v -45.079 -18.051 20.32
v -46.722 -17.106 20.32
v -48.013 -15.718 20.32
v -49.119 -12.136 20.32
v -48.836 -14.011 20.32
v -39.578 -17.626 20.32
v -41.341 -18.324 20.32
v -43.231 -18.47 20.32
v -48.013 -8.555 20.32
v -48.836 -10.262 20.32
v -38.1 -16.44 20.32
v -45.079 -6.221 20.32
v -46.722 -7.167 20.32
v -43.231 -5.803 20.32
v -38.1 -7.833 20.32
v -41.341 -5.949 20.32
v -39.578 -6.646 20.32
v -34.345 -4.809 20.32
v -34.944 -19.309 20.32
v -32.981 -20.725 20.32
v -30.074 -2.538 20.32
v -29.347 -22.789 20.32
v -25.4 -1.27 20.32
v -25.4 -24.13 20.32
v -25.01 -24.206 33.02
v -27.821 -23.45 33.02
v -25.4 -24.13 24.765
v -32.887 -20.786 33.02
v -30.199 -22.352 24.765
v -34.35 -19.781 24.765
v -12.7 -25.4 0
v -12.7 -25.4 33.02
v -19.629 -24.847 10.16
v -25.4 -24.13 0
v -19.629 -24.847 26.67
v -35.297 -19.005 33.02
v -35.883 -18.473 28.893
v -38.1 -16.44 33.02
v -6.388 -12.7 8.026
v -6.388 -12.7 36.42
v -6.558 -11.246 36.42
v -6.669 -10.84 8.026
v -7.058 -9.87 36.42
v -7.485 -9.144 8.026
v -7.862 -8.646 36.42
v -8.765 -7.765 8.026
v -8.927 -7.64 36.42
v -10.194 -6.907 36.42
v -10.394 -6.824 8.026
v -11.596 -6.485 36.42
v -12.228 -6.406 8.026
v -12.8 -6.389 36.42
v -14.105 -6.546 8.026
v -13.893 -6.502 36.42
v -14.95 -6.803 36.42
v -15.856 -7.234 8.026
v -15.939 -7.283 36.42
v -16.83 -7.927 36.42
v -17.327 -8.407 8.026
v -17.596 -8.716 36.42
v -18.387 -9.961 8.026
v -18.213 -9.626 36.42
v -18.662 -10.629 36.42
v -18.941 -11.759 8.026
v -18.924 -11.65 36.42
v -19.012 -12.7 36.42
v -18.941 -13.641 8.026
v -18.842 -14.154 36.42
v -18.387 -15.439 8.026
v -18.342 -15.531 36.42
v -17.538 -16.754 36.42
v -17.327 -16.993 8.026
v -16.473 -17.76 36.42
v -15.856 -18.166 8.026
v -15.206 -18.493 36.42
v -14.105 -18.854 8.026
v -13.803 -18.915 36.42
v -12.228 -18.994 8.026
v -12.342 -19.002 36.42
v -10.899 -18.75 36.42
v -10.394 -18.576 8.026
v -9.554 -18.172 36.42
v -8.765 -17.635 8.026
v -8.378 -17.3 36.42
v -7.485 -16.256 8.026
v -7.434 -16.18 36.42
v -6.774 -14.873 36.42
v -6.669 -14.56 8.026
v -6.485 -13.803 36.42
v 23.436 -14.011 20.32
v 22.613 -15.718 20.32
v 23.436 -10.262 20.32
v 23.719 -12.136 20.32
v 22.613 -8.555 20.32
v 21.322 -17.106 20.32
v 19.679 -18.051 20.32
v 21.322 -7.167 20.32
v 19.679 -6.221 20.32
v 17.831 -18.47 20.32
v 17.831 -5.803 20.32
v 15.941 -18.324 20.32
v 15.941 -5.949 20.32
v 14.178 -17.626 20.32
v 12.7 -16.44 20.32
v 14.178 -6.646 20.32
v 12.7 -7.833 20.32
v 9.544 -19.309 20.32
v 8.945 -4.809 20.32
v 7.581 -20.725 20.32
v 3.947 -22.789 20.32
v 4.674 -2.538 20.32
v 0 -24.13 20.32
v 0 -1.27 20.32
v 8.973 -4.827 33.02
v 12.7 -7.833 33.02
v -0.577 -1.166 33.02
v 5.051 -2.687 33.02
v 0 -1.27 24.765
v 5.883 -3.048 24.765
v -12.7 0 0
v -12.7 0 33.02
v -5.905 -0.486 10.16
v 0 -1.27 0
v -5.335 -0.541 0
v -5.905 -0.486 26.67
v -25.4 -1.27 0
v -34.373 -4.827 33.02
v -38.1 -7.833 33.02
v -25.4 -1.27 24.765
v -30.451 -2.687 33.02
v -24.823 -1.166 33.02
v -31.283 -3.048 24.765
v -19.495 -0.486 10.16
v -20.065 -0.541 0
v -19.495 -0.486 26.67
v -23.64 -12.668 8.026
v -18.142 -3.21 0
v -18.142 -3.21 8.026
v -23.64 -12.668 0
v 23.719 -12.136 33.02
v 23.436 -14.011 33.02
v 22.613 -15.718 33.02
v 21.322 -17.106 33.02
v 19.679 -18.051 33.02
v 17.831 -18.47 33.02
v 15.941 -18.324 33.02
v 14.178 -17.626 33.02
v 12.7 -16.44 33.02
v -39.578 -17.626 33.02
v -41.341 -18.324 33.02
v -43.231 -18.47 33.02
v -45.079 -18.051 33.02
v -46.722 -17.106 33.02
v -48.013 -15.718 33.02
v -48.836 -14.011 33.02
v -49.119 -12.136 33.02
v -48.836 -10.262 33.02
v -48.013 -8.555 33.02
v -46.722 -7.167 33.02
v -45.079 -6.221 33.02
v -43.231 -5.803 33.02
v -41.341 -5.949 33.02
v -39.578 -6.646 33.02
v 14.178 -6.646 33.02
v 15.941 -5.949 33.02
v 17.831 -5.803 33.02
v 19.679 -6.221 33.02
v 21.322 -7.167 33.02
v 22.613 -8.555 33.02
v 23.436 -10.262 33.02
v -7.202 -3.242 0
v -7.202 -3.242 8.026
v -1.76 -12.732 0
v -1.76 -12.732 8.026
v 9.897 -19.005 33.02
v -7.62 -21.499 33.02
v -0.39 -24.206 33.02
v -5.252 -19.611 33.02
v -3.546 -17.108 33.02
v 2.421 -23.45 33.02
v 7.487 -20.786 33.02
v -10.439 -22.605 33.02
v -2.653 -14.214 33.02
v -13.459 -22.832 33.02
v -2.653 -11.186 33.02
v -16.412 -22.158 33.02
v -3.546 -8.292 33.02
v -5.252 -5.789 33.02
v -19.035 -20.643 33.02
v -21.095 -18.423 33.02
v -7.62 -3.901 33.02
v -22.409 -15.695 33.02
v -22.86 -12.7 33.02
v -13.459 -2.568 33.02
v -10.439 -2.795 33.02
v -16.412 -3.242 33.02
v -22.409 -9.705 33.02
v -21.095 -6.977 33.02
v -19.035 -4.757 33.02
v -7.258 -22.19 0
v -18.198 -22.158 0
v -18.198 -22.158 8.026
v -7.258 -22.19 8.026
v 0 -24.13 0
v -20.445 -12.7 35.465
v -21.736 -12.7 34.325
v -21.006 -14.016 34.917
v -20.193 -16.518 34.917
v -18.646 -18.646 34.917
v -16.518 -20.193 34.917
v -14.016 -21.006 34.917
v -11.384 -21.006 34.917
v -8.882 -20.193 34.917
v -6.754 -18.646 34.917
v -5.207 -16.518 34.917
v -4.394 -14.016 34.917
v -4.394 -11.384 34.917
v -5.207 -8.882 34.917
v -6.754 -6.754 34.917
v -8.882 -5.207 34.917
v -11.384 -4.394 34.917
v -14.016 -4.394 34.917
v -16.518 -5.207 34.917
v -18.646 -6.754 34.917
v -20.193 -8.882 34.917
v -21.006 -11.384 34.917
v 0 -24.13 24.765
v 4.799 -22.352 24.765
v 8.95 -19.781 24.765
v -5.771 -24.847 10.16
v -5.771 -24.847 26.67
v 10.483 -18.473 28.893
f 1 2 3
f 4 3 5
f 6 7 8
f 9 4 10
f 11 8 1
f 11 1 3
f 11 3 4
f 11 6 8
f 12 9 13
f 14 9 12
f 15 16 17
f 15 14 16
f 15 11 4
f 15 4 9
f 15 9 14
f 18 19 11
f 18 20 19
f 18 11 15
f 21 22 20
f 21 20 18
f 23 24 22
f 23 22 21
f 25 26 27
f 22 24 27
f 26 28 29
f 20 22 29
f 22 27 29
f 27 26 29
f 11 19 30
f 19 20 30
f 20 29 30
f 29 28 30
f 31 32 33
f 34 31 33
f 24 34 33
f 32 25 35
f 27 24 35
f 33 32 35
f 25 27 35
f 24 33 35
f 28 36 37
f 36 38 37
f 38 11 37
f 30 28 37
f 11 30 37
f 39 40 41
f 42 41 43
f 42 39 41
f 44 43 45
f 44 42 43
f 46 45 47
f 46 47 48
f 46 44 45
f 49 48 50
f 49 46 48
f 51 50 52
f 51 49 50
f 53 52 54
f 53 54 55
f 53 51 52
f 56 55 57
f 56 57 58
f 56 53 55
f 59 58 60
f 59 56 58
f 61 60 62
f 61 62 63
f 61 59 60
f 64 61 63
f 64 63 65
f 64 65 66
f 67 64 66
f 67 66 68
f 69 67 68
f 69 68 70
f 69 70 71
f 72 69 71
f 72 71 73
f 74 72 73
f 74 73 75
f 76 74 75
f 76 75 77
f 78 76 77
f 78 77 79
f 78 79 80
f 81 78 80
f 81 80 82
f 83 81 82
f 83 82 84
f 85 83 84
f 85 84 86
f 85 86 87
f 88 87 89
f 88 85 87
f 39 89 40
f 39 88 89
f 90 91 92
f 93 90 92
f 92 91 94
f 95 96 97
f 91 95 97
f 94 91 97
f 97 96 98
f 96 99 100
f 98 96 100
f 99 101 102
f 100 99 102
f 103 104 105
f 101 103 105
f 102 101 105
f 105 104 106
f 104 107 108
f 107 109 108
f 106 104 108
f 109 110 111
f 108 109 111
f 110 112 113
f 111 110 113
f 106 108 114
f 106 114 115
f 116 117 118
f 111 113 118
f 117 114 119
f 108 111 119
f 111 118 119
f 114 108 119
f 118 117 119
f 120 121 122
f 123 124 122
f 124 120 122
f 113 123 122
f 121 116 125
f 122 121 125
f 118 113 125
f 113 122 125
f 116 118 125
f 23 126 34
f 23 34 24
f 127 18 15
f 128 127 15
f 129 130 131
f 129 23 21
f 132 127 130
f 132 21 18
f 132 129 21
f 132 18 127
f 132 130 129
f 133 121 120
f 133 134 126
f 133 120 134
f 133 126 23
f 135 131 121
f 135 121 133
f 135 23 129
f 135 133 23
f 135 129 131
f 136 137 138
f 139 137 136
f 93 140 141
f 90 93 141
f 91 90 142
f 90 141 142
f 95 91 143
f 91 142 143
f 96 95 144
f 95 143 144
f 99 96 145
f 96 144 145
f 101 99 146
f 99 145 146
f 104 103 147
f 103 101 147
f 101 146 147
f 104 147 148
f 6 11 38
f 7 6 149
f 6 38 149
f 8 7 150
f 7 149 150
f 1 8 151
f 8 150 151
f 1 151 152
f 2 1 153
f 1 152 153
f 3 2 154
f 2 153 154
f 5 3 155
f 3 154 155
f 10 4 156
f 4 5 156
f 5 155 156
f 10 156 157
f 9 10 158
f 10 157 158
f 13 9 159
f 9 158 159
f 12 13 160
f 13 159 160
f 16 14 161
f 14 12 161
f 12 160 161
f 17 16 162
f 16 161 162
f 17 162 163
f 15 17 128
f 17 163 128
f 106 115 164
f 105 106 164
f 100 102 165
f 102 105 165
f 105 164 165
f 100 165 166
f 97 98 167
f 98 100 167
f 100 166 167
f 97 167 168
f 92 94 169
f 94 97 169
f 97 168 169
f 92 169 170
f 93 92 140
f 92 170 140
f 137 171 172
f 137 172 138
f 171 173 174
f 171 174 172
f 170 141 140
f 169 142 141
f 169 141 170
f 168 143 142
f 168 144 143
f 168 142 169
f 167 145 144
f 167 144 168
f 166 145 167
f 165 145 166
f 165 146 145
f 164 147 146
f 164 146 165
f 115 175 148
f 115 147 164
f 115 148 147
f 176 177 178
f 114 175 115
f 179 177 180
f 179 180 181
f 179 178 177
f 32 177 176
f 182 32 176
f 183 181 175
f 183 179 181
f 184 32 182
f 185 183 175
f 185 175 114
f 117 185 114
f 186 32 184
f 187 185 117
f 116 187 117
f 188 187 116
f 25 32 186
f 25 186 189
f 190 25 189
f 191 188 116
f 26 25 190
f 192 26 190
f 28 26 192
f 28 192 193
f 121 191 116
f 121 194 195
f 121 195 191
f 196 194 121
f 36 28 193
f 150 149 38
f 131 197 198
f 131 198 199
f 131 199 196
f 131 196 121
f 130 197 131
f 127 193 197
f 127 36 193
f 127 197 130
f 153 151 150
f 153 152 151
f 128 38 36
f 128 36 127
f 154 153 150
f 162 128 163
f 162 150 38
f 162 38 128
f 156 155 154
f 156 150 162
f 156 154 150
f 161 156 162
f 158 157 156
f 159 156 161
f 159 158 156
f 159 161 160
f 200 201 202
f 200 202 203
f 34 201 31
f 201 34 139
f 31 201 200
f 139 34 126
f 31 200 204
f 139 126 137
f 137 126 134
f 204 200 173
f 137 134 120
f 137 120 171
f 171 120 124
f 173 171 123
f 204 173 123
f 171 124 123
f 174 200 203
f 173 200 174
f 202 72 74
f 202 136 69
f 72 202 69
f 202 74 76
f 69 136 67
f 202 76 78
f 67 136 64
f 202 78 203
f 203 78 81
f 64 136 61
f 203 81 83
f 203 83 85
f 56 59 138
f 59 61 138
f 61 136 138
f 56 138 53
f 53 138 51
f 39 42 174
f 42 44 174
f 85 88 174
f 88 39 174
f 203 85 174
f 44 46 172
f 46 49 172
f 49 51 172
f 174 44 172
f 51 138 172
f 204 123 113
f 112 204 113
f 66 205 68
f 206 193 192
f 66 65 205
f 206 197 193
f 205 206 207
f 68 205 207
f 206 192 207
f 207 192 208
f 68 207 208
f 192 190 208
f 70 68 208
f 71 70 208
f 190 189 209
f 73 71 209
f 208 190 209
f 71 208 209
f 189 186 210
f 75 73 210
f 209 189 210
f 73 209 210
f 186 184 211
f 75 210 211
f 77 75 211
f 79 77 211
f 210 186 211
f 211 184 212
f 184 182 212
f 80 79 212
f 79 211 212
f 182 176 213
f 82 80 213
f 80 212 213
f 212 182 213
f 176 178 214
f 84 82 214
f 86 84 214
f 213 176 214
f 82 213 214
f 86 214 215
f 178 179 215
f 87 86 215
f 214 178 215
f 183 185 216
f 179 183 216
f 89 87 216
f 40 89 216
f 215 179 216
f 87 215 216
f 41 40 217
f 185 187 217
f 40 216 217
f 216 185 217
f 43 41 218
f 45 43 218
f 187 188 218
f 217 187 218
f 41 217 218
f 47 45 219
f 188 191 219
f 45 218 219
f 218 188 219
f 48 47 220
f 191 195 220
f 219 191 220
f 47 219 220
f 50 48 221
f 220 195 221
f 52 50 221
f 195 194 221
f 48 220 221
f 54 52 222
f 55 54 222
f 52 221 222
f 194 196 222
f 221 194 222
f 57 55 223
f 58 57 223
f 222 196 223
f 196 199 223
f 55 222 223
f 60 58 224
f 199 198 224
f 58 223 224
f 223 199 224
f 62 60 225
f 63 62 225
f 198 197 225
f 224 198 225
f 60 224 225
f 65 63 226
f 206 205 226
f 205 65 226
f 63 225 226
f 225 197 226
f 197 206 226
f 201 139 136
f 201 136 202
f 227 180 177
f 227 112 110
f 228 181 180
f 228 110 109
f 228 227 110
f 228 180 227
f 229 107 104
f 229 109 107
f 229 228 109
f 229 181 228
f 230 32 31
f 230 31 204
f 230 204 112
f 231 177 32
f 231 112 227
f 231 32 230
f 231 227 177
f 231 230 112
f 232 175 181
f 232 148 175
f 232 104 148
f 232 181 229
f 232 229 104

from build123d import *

# Parameters (mm, degrees)
F0_W      = 25.4
F0_H      = 25.4
F1_DEPTH  = 25.4
F2_R      = 6.3119
F3_DEPTH  = 8.0264
F7_W      = 25.4
F7_H      = 12.7
F8_DEPTH  = 50.8
F9_DEPTH  = 25.4
F11_DEPTH = 50.8
F12_DEPTH = 50.8
F13_DEPTH = 25.4
F14_DEPTH = 50.8
F15_DEPTH = 50.8


with BuildPart() as f1:
    # F0 (on Front) → F1 (new body)
    with BuildSketch(Plane.XZ):
        with Locations((-12.7, 12.7)):
            Rectangle(F0_W, F0_H)
    extrude(amount=F1_DEPTH)

    # F2 (on Top) → F3 (cut)
    with BuildSketch(Plane.XY):
        Polygon((-7.2579364777, -22.1902352696), (-1.7601834075, -12.7321523755), (-7.2022469298, -3.2419171059), (-18.1420635223, -3.2097647304), (-23.6398165925, -12.6678476245), (-18.1977530702, -22.1580828941), align=None)
        with Locations((-12.7, -12.7)):
            Circle(F2_R, mode=Mode.SUBTRACT)
    extrude(amount=F3_DEPTH, mode=Mode.SUBTRACT)

    # F5 (on offset) → F6 (revolve)
    with BuildSketch(Plane.XZ.offset(12.7)):
        with BuildLine():
            Line((-12.7, 25.4), (-12.7, 38.1))
            ThreePointArc((-12.7, 38.1), (-21.6802561211, 34.3802561211), (-25.4, 25.4))
            Line((-25.4, 25.4), (-12.7, 25.4))
        make_face()
    revolve(axis=Axis((-12.7, -12.7, 31.75), (0, 0, 1)))

    # F7 (on Right) → F8 (join)
    with BuildSketch(Plane.YZ):
        with Locations((-12.7, 26.67)):
            Rectangle(F7_W, F7_H)
    extrude(amount=-F8_DEPTH)

    # F7 (on Right) → F9 (join)
    with BuildSketch(Plane.YZ):
        with Locations((-12.7, 26.67)):
            Rectangle(F7_W, F7_H)
    extrude(amount=F9_DEPTH)

    # F10 (on face) → F11 (cut)
    with BuildSketch(Plane.XY.offset(33.02)):
        with BuildLine():
            add(Edge.make_bspline(
                [(-12.7, 0), (-17.3658879301, -0.2554953412), (-25.0834624368, -0.8683027323), (-31.191647473, -2.7804494515), (-34.6991875165, -5.0056243623), (-36.660656333, -6.4021432772), (-38.1, -7.8327860683)],
                knots=[0, 0, 0, 0, 0.3525244295, 0.5971540178, 0.7887122331, 1, 1, 1, 1], degree=3))
            Line((-12.7, 0), (-38.1, 0))
            Line((-38.1, 0), (-38.1, -7.8327860683))
        make_face()
    extrude(amount=-F11_DEPTH, mode=Mode.SUBTRACT)

    # F10 (on face) → F12 (cut)
    with BuildSketch(Plane.XY.offset(33.02)):
        with BuildLine():
            add(Edge.make_bspline(
                [(-12.7, -25.4), (-17.3987553045, -24.9769857908), (-25.3139427174, -24.6420420616), (-30.0058965126, -22.5738416728), (-34.8725168747, -19.6257840333), (-36.0709987581, -18.2458739728), (-38.1, -16.4399109781)],
                knots=[0, 0, 0, 0, 0.3473379926, 0.5672748801, 0.7821069123, 1, 1, 1, 1], degree=3))
            Line((-38.1, -16.4399109781), (-38.1, -25.4))
            Line((-38.1, -25.4), (-12.7, -25.4))
        make_face()
    extrude(amount=-F12_DEPTH, mode=Mode.SUBTRACT)

    # F10 (on face) → F13 (cut)
    with BuildSketch(Plane.XY.offset(33.02)):
        with BuildLine():
            Line((-38.1, -7.8327860683), (-38.1, 0))
            Line((-38.1, 0), (-50.8, 0))
            Line((-50.8, 0), (-50.8, -25.4))
            Line((-50.8, -25.4), (-38.1, -25.4))
            Line((-38.1, -25.4), (-38.1, -16.4399109781))
            ThreePointArc((-38.1, -16.4399109781), (-49.1192451421, -12.1363485232), (-38.1, -7.8327860683))
        make_face()
    extrude(amount=-F13_DEPTH, mode=Mode.SUBTRACT)

    # F10 (on face) → F14 (cut)
    with BuildSketch(Plane.XY.offset(33.02)):
        with BuildLine():
            Line((25.4, 0), (-12.7, 0))
            add(Edge.make_bspline(
                [(-12.7, 0), (-8.0341120699, -0.2554953412), (-0.3165375632, -0.8683027323), (5.791647473, -2.7804494515), (9.2991875165, -5.0056243623), (11.260656333, -6.4021432772), (12.7, -7.8327860683)],
                knots=[0, 0, 0, 0, 0.3525244295, 0.5971540178, 0.7887122331, 1, 1, 1, 1], degree=3))
            ThreePointArc((12.7, -7.8327860683), (19.6793093563, -6.22144334), (23.7192451421, -12.1363485232))
            ThreePointArc((23.7192451421, -12.1363485232), (19.6793093563, -18.0512537064), (12.7, -16.4399109781))
            add(Edge.make_bspline(
                [(-12.7, -25.4), (-8.0012446955, -24.9769857908), (-0.0860572826, -24.6420420616), (4.6058965126, -22.5738416728), (9.4725168747, -19.6257840333), (10.6709987581, -18.2458739728), (12.7, -16.4399109781)],
                knots=[0, 0, 0, 0, 0.3473379926, 0.5672748801, 0.7821069123, 1, 1, 1, 1], degree=3))
            Line((-12.7, -25.4), (25.4, -25.4))
            Line((25.4, -25.4), (25.4, 0))
        make_face()
    extrude(amount=-F14_DEPTH, mode=Mode.SUBTRACT)

    # F2 (on Top) → F15 (cut)
    with BuildSketch(Plane.XY):
        with Locations((-12.7, -12.7)):
            Circle(F2_R)
    extrude(amount=F15_DEPTH, mode=Mode.SUBTRACT)


solid = f1.part
